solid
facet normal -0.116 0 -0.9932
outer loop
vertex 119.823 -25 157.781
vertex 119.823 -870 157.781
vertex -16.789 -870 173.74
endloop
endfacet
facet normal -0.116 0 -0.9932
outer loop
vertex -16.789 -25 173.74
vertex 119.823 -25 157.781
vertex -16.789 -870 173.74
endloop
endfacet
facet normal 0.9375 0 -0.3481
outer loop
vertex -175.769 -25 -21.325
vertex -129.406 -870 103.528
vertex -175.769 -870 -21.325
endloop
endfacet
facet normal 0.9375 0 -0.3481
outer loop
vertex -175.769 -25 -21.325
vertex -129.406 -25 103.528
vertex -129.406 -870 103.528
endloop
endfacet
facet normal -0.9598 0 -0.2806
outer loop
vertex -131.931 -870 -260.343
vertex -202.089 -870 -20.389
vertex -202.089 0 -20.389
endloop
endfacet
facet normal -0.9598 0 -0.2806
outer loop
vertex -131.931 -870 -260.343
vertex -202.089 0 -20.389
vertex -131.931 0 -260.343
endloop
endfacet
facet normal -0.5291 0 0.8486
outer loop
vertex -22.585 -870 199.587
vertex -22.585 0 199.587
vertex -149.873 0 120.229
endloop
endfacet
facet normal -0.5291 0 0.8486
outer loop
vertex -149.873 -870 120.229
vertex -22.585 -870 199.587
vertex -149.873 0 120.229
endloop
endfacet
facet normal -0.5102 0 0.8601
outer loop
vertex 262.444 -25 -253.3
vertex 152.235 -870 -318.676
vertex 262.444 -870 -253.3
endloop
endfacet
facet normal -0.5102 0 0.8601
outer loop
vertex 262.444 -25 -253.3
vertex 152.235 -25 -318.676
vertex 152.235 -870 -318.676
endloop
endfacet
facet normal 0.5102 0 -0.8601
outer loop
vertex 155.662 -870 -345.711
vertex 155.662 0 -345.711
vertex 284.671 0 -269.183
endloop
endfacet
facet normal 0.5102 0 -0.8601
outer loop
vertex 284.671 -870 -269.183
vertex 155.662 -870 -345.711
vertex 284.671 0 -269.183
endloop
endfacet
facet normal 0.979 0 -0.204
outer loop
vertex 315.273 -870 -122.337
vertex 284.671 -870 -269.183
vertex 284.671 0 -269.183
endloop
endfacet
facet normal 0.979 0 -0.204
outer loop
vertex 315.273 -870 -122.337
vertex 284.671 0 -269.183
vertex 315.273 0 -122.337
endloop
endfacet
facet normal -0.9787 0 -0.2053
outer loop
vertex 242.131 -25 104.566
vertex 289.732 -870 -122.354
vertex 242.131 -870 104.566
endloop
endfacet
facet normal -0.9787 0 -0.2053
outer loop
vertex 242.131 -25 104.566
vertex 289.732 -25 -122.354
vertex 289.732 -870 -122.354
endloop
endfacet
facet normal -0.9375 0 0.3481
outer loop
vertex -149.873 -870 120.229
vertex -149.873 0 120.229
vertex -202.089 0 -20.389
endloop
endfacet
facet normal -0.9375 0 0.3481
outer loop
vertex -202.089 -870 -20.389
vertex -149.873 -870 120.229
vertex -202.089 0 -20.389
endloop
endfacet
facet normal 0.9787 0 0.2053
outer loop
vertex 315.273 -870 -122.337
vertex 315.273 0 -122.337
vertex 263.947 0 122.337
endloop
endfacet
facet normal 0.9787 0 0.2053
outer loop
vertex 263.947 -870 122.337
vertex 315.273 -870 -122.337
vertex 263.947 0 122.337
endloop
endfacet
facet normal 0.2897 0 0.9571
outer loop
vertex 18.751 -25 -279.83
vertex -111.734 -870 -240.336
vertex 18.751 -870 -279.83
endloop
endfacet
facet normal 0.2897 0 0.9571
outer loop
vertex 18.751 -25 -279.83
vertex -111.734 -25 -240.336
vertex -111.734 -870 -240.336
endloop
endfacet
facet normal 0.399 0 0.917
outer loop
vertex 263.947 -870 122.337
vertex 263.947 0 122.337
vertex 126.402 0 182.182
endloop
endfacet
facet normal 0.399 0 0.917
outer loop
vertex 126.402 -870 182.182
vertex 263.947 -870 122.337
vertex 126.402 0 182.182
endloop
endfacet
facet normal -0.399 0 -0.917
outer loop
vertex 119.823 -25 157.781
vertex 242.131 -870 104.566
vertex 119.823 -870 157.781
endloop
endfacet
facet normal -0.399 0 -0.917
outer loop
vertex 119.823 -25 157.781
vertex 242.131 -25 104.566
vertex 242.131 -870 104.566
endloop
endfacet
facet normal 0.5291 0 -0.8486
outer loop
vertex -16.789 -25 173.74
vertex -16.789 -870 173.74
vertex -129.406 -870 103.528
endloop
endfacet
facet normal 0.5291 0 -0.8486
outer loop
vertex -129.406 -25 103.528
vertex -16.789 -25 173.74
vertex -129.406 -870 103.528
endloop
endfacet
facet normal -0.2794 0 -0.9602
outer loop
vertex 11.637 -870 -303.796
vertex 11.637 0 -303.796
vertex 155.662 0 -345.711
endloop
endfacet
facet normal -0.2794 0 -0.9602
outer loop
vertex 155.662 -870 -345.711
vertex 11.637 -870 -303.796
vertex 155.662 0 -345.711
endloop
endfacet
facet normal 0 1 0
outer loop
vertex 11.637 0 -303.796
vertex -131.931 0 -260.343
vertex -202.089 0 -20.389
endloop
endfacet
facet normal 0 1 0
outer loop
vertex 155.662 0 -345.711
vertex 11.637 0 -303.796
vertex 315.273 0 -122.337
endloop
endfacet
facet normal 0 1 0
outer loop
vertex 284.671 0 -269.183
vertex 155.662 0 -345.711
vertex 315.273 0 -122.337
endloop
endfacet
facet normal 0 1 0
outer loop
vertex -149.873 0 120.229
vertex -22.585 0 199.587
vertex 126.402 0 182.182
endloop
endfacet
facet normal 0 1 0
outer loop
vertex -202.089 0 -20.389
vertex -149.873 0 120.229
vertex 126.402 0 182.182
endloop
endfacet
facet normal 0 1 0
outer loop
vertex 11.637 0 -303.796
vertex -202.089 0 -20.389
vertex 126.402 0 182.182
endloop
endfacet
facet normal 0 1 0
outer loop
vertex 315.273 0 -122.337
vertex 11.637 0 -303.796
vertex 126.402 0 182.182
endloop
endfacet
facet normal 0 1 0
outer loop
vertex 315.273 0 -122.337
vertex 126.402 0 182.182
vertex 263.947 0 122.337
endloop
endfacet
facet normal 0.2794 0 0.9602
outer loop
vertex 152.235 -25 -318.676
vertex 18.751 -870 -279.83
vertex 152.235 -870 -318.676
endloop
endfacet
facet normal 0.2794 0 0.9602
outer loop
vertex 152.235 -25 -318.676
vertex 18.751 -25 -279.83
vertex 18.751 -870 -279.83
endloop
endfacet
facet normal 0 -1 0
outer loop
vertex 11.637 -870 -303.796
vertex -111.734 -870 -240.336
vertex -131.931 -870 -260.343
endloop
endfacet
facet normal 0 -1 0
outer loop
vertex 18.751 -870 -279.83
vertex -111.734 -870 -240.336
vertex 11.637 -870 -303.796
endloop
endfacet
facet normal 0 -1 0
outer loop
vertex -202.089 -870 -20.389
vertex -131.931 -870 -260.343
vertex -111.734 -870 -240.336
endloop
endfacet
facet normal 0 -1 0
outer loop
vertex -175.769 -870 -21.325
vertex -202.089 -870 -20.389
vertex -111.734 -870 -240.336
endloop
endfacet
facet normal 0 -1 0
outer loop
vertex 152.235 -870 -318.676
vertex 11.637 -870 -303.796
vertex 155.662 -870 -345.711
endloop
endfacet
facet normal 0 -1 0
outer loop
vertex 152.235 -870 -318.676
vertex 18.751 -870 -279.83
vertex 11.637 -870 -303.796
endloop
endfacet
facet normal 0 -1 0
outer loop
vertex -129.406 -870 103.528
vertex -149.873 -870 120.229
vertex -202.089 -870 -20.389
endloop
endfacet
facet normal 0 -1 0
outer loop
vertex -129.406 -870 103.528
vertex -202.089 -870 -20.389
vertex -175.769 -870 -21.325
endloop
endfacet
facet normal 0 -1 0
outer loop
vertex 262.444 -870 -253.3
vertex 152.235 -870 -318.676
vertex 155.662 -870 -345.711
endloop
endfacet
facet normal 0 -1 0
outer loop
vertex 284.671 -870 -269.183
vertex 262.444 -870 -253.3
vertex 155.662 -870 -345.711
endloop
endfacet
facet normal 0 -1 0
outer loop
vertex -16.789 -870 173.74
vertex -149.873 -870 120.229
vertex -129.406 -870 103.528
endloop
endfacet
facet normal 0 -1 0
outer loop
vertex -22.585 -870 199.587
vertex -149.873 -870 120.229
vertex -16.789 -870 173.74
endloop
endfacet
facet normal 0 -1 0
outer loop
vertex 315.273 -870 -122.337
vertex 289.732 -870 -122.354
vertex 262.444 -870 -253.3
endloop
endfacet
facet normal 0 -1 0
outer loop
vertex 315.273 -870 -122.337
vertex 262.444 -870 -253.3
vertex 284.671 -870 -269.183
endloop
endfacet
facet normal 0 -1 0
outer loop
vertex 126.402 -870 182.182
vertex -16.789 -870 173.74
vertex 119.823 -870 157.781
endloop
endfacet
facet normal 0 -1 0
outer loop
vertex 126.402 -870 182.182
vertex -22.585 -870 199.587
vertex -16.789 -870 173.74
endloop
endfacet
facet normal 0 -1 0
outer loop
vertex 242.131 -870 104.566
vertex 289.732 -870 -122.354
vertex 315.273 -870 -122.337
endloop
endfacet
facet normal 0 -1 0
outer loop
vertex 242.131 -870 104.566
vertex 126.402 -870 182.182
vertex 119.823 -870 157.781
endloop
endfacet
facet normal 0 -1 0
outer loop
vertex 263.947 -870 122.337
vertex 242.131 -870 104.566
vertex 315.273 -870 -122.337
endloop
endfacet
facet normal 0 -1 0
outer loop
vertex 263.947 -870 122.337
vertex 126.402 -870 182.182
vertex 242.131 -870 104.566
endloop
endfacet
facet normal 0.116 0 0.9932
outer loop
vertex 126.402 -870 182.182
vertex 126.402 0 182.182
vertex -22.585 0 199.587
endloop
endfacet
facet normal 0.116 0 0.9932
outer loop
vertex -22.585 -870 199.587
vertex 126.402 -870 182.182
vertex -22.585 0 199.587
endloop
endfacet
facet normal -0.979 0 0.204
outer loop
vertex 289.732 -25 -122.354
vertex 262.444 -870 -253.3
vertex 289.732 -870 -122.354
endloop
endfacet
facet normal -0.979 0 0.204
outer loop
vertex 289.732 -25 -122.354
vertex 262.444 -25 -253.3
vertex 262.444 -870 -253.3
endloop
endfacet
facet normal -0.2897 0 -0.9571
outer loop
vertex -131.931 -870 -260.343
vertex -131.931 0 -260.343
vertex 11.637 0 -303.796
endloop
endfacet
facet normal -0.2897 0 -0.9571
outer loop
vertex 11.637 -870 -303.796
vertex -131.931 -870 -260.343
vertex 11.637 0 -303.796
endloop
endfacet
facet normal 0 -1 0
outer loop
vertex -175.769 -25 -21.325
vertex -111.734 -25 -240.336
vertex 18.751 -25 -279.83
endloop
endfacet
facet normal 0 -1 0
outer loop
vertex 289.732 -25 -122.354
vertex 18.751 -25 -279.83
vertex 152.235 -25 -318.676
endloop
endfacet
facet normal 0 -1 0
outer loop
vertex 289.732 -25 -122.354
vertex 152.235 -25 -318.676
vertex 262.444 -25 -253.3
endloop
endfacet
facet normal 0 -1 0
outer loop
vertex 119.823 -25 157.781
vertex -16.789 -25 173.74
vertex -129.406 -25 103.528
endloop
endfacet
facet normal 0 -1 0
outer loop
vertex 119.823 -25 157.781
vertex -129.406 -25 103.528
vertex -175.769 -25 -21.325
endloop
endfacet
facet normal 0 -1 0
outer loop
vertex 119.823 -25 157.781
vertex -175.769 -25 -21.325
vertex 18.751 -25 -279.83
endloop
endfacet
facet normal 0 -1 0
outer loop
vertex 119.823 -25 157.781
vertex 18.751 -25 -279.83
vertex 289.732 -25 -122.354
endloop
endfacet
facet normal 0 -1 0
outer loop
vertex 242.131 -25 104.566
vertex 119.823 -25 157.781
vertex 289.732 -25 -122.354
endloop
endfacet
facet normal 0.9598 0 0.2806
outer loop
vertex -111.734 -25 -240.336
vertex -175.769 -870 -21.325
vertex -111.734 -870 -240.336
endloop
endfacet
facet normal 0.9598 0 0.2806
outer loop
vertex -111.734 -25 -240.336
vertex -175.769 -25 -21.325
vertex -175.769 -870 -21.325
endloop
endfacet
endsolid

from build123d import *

# Parameters (mm, degrees)
F1_DEPTH = 870
F2_T     = -25


with BuildPart() as f1:
    # F0 (on Front) → F1 (new body)
    with BuildSketch(Plane.XZ):
        Polygon((315.272604, -122.337317), (263.946945, 122.337317), (126.402124, 182.182302), (-22.584686, 199.587198), (-149.872822, 120.228958), (-202.089188, -20.389146), (-131.931266, -260.343029), (11.636889, -303.796281), (155.66179, -345.710812), (284.671261, -269.18267), align=None)
    extrude(amount=F1_DEPTH)

    # F2
    f2_openings = [f1.faces().sort_by_distance(p)[0] for p in [
        (64.144057, -870, -68.345296),
    ]]
    offset(amount=F2_T, openings=f2_openings)


solid = f1.part
